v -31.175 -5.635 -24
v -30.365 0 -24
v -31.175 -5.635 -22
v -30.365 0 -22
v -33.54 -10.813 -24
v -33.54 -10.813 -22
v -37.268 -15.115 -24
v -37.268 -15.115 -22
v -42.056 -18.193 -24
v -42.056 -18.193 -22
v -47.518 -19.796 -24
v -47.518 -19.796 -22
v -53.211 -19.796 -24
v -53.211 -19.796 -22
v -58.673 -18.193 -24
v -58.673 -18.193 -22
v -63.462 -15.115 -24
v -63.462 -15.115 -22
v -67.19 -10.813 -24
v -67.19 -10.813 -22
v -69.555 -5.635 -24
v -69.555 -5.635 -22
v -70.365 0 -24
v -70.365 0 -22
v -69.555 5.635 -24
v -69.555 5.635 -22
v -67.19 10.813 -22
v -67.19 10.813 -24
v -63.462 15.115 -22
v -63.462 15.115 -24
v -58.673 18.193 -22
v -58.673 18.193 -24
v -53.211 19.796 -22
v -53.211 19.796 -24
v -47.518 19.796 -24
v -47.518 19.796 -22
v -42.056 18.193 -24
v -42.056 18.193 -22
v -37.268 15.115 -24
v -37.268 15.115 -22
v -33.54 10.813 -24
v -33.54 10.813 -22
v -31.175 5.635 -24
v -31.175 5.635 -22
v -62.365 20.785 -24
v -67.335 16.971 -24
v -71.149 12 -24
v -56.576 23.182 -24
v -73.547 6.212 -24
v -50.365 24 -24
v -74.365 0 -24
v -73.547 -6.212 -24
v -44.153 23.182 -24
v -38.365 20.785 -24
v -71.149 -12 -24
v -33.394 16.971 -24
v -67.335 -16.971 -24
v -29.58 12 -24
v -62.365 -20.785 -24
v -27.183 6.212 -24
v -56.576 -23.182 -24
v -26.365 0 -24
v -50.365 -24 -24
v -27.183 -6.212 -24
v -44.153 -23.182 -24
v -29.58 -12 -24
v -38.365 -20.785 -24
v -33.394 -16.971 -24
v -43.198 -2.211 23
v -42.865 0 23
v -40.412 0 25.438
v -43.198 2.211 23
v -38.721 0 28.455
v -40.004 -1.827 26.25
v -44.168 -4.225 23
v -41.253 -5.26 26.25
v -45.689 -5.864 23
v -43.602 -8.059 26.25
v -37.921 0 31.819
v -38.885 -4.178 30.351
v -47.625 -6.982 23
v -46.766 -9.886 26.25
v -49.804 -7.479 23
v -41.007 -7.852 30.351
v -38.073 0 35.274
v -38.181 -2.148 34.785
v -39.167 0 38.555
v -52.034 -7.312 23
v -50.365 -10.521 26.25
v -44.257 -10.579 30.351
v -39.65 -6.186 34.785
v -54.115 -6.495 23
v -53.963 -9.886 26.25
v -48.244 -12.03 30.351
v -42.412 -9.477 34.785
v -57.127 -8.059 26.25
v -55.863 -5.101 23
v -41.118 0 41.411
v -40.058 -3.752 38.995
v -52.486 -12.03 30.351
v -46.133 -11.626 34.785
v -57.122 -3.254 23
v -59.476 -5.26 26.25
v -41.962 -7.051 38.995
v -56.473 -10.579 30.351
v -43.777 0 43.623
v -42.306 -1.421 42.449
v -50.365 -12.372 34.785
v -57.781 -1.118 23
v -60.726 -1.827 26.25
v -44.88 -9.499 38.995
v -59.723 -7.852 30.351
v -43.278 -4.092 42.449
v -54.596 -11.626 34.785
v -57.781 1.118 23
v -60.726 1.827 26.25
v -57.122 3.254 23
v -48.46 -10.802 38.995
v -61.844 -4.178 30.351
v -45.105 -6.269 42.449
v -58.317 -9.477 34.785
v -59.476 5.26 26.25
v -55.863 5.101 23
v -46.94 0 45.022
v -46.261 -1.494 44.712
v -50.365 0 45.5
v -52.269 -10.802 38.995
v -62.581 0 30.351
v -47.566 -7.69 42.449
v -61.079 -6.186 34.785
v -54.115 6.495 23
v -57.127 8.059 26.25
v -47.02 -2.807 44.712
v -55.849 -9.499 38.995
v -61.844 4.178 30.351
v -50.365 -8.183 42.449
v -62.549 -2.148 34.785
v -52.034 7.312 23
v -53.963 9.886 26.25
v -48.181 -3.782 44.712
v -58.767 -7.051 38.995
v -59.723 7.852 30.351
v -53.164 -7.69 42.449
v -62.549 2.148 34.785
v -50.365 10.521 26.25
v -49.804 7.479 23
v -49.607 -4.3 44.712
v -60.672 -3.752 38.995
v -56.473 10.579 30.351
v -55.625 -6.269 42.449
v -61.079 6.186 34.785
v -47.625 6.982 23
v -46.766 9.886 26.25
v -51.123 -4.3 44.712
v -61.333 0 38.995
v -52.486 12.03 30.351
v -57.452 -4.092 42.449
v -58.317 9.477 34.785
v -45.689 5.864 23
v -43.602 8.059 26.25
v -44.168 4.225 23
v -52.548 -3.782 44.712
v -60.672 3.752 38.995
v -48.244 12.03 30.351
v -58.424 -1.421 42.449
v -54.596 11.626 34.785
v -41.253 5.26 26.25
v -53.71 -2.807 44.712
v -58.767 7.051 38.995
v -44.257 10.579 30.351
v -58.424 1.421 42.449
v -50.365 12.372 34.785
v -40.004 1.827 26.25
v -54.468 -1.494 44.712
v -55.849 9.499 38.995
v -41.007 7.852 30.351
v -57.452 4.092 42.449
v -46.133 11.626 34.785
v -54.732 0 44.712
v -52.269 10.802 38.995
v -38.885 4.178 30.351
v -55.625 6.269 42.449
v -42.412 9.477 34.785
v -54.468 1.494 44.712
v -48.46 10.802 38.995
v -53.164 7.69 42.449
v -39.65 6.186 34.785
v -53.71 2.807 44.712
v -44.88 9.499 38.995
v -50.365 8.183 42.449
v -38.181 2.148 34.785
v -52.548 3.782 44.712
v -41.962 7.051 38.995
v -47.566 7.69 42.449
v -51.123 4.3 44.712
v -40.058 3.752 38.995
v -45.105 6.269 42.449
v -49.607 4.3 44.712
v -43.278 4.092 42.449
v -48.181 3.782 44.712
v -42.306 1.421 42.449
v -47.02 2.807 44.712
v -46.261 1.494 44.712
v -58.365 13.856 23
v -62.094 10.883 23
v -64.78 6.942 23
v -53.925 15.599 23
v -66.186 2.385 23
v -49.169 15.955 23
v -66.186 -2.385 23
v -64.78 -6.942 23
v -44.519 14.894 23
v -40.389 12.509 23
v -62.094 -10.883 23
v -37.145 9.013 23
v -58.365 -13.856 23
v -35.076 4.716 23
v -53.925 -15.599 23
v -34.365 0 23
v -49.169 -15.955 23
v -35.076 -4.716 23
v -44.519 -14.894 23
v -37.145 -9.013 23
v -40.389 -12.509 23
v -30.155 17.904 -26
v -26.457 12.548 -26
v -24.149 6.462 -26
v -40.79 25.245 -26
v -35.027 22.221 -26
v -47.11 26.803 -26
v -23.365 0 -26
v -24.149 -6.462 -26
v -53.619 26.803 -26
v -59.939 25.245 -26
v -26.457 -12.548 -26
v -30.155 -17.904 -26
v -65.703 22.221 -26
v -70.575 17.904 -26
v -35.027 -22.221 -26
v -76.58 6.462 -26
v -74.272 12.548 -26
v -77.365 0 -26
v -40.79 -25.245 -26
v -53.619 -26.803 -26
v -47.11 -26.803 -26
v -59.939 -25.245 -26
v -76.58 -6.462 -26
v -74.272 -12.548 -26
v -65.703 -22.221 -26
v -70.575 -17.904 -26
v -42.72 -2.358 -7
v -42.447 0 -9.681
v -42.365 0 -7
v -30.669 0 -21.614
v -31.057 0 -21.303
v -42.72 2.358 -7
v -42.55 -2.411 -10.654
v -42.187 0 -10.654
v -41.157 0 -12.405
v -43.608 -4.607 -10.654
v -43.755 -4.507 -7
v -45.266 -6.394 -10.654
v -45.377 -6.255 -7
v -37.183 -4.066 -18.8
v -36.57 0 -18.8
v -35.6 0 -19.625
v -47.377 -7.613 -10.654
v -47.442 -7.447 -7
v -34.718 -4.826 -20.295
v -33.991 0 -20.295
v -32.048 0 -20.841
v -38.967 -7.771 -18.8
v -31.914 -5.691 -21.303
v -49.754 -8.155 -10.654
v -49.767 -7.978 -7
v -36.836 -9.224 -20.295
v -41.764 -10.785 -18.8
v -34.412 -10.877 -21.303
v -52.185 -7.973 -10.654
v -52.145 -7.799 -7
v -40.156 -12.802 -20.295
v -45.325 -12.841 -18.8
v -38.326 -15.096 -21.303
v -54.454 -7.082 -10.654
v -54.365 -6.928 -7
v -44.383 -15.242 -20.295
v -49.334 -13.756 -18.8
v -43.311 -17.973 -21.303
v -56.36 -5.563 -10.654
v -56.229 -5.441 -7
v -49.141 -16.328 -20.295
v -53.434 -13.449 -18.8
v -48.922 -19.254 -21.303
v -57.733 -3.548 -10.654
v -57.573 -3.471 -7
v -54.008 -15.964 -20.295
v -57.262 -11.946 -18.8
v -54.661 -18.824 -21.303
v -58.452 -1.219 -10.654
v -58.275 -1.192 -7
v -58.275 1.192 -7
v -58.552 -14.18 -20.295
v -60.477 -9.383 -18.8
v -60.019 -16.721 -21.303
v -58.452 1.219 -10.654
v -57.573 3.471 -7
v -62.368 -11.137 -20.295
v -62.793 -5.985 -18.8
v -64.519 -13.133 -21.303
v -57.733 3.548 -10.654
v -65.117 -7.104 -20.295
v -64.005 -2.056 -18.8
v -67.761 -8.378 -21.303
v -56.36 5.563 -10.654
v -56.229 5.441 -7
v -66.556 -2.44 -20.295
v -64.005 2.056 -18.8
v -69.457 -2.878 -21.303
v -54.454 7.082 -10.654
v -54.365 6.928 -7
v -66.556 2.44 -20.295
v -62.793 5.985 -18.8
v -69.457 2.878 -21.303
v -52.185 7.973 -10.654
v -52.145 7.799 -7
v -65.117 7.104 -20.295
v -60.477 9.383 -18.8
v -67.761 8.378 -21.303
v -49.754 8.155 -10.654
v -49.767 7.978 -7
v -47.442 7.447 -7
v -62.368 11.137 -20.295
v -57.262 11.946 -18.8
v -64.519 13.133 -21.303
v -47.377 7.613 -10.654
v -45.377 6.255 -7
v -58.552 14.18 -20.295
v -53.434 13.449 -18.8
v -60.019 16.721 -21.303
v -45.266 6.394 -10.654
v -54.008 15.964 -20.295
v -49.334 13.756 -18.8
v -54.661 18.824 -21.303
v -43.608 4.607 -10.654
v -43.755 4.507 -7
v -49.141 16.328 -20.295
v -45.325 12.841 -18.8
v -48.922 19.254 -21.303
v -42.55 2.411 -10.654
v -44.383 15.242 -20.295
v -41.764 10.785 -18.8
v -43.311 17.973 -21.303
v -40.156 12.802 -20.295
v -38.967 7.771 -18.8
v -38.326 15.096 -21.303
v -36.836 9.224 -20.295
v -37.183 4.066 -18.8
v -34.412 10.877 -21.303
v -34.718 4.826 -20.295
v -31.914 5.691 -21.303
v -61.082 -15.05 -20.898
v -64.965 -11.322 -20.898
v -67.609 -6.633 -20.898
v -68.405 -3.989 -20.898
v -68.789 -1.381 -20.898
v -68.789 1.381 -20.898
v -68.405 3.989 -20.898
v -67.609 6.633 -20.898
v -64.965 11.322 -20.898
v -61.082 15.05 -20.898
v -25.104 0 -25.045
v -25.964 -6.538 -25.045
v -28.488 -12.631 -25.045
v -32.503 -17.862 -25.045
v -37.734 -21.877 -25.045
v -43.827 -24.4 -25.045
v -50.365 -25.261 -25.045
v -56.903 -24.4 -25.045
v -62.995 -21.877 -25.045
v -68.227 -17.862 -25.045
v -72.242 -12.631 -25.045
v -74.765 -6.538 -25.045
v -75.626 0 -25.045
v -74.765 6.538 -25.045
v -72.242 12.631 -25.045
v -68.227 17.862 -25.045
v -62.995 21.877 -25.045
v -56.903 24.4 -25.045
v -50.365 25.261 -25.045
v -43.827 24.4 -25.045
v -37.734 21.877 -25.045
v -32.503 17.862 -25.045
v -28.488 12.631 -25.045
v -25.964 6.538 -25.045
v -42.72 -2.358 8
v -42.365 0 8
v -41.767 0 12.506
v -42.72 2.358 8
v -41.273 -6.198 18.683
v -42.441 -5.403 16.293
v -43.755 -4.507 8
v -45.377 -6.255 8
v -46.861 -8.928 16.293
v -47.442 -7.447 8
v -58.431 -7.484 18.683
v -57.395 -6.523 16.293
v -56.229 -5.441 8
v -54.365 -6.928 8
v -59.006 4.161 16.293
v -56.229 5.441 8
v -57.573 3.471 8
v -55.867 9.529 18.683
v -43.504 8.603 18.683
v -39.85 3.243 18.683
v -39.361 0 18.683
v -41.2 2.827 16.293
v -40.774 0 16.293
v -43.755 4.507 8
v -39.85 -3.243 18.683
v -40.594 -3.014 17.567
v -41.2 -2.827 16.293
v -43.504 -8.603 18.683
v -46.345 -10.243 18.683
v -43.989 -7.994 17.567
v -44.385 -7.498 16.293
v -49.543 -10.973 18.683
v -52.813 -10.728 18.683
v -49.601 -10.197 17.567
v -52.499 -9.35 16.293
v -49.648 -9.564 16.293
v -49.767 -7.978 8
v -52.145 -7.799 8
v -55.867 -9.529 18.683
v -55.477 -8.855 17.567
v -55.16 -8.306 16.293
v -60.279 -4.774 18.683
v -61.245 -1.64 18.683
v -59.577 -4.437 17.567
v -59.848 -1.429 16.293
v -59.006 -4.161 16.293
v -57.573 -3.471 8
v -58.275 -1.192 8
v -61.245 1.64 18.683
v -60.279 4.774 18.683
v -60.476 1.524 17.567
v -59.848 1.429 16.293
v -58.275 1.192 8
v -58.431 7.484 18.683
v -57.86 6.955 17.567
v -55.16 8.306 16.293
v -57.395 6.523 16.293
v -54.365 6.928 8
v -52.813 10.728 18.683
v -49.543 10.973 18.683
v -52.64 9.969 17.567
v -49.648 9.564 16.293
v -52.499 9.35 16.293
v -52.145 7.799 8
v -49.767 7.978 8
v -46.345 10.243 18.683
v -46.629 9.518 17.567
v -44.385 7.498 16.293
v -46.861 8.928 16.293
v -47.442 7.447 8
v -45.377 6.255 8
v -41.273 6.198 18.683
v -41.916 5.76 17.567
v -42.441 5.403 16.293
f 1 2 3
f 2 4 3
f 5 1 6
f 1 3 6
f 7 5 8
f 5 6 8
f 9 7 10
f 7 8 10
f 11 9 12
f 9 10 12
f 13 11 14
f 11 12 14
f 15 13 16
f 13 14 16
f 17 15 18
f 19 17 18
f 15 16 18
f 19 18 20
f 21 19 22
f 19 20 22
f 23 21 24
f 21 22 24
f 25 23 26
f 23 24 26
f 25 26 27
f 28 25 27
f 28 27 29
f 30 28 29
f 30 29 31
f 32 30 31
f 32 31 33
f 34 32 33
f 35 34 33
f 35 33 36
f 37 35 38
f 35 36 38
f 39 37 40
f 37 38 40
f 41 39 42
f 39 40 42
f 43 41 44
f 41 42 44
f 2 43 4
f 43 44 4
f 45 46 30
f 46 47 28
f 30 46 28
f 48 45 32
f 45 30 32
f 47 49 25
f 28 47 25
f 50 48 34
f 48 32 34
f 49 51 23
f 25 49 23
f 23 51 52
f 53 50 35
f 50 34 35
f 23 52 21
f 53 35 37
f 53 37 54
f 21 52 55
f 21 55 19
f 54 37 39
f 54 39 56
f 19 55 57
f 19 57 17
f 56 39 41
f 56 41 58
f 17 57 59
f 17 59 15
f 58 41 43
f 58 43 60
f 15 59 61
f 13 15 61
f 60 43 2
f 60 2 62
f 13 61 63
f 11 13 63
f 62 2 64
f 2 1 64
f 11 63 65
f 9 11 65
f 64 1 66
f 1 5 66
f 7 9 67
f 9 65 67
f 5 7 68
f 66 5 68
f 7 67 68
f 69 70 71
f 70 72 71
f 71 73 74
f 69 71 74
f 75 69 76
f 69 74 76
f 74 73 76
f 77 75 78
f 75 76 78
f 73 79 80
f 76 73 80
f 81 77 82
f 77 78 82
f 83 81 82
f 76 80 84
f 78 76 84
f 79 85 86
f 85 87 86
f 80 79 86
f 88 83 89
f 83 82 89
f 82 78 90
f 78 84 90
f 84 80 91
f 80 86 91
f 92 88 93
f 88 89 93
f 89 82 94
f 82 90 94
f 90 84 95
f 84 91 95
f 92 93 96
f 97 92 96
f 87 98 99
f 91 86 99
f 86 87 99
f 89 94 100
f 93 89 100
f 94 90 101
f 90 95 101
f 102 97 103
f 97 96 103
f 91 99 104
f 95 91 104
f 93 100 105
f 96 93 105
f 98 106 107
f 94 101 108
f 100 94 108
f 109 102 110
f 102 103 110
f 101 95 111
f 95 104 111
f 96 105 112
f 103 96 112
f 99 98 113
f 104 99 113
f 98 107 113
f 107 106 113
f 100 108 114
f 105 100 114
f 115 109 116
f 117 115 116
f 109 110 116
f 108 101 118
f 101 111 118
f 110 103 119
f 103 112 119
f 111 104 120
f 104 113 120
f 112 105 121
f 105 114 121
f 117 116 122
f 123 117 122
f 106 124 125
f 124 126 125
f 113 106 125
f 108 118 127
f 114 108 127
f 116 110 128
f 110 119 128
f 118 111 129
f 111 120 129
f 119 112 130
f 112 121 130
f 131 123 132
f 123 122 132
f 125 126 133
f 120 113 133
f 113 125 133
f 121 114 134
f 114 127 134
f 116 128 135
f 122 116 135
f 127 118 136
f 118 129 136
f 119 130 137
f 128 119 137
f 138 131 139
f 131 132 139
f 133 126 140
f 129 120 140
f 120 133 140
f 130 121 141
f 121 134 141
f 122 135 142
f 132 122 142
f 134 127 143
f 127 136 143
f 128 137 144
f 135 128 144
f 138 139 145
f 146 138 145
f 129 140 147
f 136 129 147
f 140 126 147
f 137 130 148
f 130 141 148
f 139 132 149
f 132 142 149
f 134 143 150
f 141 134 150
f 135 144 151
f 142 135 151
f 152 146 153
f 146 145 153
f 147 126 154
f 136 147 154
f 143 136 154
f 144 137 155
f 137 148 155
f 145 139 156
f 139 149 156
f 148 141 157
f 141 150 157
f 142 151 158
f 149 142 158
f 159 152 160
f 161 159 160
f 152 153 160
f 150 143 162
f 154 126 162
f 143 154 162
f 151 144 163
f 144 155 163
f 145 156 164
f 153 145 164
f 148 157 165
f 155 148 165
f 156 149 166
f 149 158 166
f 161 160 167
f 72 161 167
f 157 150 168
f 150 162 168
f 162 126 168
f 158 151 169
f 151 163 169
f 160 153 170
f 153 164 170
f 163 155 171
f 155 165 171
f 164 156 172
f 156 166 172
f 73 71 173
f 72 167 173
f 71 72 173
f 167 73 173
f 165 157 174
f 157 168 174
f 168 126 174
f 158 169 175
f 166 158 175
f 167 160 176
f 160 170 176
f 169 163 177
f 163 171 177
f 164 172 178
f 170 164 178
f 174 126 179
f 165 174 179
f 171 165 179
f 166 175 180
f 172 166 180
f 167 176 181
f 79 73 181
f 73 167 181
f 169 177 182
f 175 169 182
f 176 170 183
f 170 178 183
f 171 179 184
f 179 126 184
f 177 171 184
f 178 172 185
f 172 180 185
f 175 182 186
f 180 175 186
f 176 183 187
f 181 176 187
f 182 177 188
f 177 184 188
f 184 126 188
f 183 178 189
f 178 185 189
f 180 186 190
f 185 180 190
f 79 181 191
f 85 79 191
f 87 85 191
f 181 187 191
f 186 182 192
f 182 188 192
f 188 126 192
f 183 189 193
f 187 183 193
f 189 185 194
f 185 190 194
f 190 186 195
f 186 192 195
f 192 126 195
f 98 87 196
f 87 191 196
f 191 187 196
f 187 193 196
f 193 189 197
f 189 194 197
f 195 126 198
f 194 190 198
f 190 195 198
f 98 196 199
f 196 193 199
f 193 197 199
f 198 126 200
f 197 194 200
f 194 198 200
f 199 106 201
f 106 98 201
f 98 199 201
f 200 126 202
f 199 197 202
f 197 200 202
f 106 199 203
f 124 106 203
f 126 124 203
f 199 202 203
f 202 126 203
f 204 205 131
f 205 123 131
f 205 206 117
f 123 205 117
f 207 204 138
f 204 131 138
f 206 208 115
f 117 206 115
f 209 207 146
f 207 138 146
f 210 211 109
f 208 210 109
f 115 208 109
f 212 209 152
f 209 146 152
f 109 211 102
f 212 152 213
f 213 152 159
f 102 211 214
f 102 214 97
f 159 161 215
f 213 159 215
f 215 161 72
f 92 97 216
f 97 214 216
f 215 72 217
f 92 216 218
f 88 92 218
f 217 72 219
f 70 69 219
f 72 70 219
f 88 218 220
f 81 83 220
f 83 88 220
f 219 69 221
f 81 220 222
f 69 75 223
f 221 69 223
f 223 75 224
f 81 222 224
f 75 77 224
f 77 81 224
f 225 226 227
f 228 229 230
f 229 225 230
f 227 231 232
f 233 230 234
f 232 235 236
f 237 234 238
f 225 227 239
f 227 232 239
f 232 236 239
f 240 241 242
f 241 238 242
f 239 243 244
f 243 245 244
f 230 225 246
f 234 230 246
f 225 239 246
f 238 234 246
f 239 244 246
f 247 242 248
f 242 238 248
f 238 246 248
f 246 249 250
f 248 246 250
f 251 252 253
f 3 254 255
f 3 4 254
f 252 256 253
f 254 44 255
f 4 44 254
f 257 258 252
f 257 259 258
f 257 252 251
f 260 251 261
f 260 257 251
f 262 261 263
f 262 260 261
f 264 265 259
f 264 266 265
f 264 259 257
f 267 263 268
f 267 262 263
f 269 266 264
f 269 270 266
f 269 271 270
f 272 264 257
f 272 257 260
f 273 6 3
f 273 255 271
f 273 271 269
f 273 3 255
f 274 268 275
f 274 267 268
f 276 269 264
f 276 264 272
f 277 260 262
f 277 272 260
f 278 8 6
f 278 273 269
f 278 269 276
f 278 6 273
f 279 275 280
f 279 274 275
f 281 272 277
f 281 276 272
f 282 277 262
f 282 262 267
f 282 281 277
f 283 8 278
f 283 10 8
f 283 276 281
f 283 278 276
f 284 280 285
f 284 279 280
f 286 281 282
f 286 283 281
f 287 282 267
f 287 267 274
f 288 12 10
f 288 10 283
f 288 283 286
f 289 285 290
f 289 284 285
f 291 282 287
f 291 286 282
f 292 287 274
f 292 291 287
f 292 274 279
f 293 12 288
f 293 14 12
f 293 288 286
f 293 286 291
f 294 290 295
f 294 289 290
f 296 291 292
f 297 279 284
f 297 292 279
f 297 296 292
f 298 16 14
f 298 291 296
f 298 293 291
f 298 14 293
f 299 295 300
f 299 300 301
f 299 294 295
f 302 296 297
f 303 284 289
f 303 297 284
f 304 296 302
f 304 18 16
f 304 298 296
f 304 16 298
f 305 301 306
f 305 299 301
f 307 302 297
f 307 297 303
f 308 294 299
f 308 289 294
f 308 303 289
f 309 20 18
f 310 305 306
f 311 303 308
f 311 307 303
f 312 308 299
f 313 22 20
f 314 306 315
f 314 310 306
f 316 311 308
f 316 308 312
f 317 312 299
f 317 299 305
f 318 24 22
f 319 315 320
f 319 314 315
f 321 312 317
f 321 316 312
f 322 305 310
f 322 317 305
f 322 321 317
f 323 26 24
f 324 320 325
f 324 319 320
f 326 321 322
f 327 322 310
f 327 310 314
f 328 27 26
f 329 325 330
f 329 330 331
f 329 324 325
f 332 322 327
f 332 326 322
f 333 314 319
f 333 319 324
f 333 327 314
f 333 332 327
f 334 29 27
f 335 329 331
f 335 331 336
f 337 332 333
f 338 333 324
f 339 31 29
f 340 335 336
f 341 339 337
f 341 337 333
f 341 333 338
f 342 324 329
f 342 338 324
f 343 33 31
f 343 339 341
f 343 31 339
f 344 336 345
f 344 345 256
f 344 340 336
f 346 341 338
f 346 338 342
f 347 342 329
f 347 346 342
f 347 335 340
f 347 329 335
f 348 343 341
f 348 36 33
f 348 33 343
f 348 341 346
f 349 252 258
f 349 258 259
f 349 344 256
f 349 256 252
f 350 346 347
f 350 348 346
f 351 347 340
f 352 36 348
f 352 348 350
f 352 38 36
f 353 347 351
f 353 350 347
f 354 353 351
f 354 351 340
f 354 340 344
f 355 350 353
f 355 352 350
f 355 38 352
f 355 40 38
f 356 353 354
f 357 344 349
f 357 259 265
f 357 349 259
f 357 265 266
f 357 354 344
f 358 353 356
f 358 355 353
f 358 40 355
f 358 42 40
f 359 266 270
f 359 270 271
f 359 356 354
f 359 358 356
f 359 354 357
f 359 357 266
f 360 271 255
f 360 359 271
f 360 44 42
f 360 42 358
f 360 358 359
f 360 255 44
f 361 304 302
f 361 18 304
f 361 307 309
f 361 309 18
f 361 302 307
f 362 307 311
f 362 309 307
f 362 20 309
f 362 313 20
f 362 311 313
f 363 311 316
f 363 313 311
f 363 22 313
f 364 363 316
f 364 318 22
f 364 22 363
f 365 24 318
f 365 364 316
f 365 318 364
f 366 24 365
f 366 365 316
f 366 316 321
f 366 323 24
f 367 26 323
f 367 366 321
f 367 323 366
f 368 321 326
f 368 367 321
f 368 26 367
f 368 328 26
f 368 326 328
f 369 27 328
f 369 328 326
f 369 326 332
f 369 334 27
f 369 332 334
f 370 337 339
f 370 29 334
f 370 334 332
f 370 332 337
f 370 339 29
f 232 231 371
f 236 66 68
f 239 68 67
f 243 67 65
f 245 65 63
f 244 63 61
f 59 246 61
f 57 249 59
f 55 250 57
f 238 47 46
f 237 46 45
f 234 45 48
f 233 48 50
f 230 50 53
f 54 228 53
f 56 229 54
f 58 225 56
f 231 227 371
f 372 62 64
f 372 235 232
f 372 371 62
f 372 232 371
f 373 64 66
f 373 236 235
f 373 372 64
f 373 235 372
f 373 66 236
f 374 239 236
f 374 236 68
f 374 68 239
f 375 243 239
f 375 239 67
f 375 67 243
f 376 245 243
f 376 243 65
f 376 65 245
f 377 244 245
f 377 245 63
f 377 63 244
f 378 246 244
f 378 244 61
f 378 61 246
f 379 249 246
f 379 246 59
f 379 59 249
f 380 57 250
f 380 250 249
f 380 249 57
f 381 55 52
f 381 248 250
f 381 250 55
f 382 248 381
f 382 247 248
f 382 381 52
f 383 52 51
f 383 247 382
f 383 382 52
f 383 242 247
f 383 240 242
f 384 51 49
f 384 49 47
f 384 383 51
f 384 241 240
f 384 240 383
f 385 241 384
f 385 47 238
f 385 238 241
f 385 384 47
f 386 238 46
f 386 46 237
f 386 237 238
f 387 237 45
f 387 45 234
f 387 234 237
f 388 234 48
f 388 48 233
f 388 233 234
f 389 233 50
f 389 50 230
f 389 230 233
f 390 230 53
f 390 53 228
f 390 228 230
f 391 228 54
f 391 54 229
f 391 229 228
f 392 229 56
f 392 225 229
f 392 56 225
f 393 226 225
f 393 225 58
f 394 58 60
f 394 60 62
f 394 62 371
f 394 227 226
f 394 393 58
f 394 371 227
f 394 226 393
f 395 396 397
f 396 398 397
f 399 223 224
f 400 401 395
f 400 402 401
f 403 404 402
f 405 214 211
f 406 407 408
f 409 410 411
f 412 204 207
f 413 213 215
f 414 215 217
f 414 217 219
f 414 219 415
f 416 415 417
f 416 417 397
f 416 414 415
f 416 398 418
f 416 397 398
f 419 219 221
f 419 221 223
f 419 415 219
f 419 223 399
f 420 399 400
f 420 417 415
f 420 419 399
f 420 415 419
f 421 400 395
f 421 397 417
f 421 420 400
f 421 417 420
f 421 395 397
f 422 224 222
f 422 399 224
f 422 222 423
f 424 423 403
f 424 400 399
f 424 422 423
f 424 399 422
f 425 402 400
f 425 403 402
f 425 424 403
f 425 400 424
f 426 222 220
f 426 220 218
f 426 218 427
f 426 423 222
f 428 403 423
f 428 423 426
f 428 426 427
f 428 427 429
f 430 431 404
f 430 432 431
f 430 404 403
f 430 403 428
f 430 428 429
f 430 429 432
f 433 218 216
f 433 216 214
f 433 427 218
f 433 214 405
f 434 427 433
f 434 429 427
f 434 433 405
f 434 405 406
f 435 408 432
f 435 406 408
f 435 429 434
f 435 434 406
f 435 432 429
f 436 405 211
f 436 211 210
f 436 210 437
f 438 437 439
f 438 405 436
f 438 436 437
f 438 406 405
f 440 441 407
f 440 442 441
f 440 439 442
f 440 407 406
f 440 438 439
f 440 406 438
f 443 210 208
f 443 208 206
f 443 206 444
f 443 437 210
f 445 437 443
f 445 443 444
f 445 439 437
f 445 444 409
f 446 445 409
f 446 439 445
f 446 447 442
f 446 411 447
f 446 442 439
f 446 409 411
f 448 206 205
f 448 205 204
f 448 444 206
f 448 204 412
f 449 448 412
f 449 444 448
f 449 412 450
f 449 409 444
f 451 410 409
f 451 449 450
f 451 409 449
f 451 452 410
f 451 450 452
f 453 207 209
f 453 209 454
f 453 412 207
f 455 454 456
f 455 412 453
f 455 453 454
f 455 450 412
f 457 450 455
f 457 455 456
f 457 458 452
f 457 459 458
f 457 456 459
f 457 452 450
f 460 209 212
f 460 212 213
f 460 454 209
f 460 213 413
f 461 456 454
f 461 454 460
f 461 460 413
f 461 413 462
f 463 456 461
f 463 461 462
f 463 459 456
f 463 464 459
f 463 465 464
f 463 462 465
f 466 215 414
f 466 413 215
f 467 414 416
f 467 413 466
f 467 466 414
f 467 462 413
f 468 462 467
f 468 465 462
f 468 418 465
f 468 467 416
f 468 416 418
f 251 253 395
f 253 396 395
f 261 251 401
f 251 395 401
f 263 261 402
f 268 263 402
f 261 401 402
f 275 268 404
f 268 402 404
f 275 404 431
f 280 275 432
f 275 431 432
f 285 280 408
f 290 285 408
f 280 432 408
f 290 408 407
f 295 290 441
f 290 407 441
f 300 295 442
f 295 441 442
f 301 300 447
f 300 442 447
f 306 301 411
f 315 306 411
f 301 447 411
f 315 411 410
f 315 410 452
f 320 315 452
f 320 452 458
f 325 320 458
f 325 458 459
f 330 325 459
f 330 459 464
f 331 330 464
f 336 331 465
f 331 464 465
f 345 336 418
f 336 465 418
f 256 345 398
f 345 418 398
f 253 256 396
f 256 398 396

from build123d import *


with BuildPart() as f1:
    # F0 (on Front) → F1 (revolve)
    with BuildSketch(Plane.XZ):
        with BuildLine():
            Line((-34.3647946566, 23), (-42.8647946566, 23))
            ThreePointArc((-42.8647946566, 23), (-38.506253431, 36.9528470752), (-50.3647946566, 45.5))
            Line((-50.3647946566, 45.5), (-50.3647946566, 33))
            Line((-50.3647946566, 33), (-50.3647946566, 23))
            Line((-50.3647946566, 23), (-50.3647946566, 20.5))
            Line((-50.3647946566, 20.5), (-50.3647946566, 8))
            Line((-50.3647946566, 8), (-50.3647946566, -7))
            Line((-50.3647946566, -7), (-50.3647946566, -22))
            Line((-50.3647946566, -22), (-50.3647946566, -24))
            Line((-50.3647946566, -24), (-50.3647946566, -26))
            Line((-50.3647946566, -26), (-23.3647946566, -26))
            add(Edge.make_bspline(
                [(-26.3647946566, -24), (-25.9982562649, -24.3416980681), (-25.2078986327, -25.0784931272), (-24.0081464983, -25.678339827), (-23.3647946566, -26)],
                knots=[0, 0, 0, 0, 0.4637627029, 1, 1, 1, 1], degree=3))
            Line((-26.3647946566, -24), (-30.3647946566, -24))
            Line((-30.3647946566, -24), (-30.3647946566, -22))
            add(Edge.make_bspline(
                [(-42.3647946566, -7), (-42.4787878391, -8.0485692572), (-42.7391371687, -10.2209526594), (-40.7749060754, -12.9839321181), (-38.217886262, -16.0868243739), (-35.9512122605, -20.6909610356), (-31.2106876282, -20.5923382916), (-30.3647946566, -22)],
                knots=[0, 0, 0, 0, 0.1748825467, 0.3521897138, 0.5531673818, 0.7707374939, 1, 1, 1, 1], degree=3))
            Line((-42.3647946566, -7), (-42.3647946566, 8))
            add(Edge.make_bspline(
                [(-34.3647946566, 23), (-35.8662446943, 21.8921295755), (-38.7448384991, 19.7681102207), (-41.4636005123, 15.8398809391), (-42.0379354089, 10.8434911632), (-42.3647946566, 8)],
                knots=[0, 0, 0, 0, 0.3196282435, 0.6127942046, 1, 1, 1, 1], degree=3))
        make_face()
    revolve(axis=Axis((-50.3647946566, 0, -23), (0, 0, -1)))


solid = f1.part
